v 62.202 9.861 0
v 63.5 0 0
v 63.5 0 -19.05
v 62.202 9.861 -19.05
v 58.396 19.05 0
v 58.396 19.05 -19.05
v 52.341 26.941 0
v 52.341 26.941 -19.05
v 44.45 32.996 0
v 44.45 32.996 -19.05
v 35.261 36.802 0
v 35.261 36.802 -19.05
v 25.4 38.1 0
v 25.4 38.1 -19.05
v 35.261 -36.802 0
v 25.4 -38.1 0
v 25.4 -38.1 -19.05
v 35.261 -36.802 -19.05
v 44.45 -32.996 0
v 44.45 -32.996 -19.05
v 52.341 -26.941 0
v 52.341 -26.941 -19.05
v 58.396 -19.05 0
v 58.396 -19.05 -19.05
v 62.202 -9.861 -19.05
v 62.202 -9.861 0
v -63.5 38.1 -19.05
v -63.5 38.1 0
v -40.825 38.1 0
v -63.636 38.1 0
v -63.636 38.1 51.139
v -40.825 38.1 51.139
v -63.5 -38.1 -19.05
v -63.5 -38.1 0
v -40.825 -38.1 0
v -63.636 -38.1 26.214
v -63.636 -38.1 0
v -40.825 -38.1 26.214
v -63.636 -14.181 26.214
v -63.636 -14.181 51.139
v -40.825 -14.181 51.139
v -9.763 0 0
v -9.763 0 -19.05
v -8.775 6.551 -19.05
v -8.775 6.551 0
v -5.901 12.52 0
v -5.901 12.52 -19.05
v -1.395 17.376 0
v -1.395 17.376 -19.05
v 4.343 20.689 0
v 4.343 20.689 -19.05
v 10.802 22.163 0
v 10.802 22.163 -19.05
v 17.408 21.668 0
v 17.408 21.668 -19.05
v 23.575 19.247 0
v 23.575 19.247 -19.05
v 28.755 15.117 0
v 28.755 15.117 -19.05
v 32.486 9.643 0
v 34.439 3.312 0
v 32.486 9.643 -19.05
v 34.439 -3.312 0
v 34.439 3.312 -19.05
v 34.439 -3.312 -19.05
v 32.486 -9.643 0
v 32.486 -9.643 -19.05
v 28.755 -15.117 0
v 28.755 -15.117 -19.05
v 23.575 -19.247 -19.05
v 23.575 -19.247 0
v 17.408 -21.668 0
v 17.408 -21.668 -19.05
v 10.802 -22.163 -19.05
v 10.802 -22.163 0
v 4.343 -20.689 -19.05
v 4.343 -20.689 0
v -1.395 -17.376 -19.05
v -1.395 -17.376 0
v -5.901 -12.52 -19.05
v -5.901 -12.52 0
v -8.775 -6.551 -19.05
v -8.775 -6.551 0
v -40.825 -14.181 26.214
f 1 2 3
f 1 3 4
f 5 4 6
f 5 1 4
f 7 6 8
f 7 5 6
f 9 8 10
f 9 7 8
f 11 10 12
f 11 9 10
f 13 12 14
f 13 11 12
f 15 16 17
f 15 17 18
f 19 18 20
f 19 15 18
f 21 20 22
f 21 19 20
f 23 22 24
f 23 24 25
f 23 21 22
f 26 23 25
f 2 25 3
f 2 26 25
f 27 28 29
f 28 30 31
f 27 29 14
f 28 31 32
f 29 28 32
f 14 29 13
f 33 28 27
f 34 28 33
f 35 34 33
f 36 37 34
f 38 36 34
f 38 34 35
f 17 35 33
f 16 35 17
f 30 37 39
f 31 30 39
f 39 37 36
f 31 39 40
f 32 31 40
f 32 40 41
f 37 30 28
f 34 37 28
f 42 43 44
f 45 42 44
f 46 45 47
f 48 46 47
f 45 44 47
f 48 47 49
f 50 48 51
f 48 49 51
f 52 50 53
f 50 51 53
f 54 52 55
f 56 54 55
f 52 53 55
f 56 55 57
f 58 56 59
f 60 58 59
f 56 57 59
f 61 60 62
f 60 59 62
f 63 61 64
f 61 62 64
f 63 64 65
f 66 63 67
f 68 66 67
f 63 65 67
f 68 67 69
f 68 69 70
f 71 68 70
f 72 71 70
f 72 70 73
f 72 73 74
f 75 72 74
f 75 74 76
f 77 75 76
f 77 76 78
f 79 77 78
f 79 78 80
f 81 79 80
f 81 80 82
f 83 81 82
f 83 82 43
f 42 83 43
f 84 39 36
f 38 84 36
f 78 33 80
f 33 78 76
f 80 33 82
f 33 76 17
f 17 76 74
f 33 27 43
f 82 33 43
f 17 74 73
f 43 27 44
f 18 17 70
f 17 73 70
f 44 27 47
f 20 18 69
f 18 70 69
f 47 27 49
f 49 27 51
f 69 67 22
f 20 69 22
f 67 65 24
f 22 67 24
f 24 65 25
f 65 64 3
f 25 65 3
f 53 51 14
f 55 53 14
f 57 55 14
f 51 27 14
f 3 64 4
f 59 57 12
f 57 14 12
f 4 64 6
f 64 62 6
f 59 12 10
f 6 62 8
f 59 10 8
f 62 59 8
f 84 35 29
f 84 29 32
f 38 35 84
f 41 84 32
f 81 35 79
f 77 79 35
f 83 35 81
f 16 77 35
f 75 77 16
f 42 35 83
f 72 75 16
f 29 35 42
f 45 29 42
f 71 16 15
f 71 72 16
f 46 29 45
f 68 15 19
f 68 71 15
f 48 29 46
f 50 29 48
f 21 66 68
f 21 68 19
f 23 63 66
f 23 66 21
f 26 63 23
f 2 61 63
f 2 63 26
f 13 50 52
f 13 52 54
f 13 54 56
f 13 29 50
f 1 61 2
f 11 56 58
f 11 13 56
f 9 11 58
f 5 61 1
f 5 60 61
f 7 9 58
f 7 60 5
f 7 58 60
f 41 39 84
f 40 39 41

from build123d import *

# Parameters (mm, degrees)
F1_DEPTH = 19.05
F2_W     = 22.8103399277
F2_H     = 51.1389188468
F3_DEPTH = 38.1
F4_W     = 23.9186170459
F4_H     = 24.924851954
F5_DEPTH = 25.4
F7_D     = 44.45


with BuildPart() as f1:
    # F0 (on Top) → F1 (new body)
    with BuildSketch(Plane.XY):
        with BuildLine():
            Line((25.4, 38.1), (-63.5, 38.1))
            Line((-63.5, 38.1), (-63.5, -38.1))
            Line((-63.5, -38.1), (25.4, -38.1))
            ThreePointArc((25.4, -38.1), (52.3407683632, -26.9407683632), (63.5, 0))
            ThreePointArc((63.5, 0), (52.3407683632, 26.9407683632), (25.4, 38.1))
        make_face()
    extrude(amount=-F1_DEPTH)

    # F2 (on Front) → F3 (join, symmetric)
    with BuildSketch(Plane.XZ):
        with Locations((-52.2303506732, 25.5694594234)):
            Rectangle(F2_W, F2_H)
    extrude(amount=F3_DEPTH, both=True)

    # F4 (on face) → F5 (cut)
    with BuildSketch(Plane(origin=(-63.635520637, 0, 0), x_dir=(0, -1, 0), z_dir=(-1, 0, 0))):
        with Locations((26.1406914771, 38.6764928699)):
            Rectangle(F4_W, F4_H)
    extrude(amount=-F5_DEPTH, mode=Mode.SUBTRACT)

    # F7 (through all)
    with Locations(Plane.XY):
        with Locations((12.4624269083, 0)):
            Hole(F7_D / 2)


solid = f1.part
